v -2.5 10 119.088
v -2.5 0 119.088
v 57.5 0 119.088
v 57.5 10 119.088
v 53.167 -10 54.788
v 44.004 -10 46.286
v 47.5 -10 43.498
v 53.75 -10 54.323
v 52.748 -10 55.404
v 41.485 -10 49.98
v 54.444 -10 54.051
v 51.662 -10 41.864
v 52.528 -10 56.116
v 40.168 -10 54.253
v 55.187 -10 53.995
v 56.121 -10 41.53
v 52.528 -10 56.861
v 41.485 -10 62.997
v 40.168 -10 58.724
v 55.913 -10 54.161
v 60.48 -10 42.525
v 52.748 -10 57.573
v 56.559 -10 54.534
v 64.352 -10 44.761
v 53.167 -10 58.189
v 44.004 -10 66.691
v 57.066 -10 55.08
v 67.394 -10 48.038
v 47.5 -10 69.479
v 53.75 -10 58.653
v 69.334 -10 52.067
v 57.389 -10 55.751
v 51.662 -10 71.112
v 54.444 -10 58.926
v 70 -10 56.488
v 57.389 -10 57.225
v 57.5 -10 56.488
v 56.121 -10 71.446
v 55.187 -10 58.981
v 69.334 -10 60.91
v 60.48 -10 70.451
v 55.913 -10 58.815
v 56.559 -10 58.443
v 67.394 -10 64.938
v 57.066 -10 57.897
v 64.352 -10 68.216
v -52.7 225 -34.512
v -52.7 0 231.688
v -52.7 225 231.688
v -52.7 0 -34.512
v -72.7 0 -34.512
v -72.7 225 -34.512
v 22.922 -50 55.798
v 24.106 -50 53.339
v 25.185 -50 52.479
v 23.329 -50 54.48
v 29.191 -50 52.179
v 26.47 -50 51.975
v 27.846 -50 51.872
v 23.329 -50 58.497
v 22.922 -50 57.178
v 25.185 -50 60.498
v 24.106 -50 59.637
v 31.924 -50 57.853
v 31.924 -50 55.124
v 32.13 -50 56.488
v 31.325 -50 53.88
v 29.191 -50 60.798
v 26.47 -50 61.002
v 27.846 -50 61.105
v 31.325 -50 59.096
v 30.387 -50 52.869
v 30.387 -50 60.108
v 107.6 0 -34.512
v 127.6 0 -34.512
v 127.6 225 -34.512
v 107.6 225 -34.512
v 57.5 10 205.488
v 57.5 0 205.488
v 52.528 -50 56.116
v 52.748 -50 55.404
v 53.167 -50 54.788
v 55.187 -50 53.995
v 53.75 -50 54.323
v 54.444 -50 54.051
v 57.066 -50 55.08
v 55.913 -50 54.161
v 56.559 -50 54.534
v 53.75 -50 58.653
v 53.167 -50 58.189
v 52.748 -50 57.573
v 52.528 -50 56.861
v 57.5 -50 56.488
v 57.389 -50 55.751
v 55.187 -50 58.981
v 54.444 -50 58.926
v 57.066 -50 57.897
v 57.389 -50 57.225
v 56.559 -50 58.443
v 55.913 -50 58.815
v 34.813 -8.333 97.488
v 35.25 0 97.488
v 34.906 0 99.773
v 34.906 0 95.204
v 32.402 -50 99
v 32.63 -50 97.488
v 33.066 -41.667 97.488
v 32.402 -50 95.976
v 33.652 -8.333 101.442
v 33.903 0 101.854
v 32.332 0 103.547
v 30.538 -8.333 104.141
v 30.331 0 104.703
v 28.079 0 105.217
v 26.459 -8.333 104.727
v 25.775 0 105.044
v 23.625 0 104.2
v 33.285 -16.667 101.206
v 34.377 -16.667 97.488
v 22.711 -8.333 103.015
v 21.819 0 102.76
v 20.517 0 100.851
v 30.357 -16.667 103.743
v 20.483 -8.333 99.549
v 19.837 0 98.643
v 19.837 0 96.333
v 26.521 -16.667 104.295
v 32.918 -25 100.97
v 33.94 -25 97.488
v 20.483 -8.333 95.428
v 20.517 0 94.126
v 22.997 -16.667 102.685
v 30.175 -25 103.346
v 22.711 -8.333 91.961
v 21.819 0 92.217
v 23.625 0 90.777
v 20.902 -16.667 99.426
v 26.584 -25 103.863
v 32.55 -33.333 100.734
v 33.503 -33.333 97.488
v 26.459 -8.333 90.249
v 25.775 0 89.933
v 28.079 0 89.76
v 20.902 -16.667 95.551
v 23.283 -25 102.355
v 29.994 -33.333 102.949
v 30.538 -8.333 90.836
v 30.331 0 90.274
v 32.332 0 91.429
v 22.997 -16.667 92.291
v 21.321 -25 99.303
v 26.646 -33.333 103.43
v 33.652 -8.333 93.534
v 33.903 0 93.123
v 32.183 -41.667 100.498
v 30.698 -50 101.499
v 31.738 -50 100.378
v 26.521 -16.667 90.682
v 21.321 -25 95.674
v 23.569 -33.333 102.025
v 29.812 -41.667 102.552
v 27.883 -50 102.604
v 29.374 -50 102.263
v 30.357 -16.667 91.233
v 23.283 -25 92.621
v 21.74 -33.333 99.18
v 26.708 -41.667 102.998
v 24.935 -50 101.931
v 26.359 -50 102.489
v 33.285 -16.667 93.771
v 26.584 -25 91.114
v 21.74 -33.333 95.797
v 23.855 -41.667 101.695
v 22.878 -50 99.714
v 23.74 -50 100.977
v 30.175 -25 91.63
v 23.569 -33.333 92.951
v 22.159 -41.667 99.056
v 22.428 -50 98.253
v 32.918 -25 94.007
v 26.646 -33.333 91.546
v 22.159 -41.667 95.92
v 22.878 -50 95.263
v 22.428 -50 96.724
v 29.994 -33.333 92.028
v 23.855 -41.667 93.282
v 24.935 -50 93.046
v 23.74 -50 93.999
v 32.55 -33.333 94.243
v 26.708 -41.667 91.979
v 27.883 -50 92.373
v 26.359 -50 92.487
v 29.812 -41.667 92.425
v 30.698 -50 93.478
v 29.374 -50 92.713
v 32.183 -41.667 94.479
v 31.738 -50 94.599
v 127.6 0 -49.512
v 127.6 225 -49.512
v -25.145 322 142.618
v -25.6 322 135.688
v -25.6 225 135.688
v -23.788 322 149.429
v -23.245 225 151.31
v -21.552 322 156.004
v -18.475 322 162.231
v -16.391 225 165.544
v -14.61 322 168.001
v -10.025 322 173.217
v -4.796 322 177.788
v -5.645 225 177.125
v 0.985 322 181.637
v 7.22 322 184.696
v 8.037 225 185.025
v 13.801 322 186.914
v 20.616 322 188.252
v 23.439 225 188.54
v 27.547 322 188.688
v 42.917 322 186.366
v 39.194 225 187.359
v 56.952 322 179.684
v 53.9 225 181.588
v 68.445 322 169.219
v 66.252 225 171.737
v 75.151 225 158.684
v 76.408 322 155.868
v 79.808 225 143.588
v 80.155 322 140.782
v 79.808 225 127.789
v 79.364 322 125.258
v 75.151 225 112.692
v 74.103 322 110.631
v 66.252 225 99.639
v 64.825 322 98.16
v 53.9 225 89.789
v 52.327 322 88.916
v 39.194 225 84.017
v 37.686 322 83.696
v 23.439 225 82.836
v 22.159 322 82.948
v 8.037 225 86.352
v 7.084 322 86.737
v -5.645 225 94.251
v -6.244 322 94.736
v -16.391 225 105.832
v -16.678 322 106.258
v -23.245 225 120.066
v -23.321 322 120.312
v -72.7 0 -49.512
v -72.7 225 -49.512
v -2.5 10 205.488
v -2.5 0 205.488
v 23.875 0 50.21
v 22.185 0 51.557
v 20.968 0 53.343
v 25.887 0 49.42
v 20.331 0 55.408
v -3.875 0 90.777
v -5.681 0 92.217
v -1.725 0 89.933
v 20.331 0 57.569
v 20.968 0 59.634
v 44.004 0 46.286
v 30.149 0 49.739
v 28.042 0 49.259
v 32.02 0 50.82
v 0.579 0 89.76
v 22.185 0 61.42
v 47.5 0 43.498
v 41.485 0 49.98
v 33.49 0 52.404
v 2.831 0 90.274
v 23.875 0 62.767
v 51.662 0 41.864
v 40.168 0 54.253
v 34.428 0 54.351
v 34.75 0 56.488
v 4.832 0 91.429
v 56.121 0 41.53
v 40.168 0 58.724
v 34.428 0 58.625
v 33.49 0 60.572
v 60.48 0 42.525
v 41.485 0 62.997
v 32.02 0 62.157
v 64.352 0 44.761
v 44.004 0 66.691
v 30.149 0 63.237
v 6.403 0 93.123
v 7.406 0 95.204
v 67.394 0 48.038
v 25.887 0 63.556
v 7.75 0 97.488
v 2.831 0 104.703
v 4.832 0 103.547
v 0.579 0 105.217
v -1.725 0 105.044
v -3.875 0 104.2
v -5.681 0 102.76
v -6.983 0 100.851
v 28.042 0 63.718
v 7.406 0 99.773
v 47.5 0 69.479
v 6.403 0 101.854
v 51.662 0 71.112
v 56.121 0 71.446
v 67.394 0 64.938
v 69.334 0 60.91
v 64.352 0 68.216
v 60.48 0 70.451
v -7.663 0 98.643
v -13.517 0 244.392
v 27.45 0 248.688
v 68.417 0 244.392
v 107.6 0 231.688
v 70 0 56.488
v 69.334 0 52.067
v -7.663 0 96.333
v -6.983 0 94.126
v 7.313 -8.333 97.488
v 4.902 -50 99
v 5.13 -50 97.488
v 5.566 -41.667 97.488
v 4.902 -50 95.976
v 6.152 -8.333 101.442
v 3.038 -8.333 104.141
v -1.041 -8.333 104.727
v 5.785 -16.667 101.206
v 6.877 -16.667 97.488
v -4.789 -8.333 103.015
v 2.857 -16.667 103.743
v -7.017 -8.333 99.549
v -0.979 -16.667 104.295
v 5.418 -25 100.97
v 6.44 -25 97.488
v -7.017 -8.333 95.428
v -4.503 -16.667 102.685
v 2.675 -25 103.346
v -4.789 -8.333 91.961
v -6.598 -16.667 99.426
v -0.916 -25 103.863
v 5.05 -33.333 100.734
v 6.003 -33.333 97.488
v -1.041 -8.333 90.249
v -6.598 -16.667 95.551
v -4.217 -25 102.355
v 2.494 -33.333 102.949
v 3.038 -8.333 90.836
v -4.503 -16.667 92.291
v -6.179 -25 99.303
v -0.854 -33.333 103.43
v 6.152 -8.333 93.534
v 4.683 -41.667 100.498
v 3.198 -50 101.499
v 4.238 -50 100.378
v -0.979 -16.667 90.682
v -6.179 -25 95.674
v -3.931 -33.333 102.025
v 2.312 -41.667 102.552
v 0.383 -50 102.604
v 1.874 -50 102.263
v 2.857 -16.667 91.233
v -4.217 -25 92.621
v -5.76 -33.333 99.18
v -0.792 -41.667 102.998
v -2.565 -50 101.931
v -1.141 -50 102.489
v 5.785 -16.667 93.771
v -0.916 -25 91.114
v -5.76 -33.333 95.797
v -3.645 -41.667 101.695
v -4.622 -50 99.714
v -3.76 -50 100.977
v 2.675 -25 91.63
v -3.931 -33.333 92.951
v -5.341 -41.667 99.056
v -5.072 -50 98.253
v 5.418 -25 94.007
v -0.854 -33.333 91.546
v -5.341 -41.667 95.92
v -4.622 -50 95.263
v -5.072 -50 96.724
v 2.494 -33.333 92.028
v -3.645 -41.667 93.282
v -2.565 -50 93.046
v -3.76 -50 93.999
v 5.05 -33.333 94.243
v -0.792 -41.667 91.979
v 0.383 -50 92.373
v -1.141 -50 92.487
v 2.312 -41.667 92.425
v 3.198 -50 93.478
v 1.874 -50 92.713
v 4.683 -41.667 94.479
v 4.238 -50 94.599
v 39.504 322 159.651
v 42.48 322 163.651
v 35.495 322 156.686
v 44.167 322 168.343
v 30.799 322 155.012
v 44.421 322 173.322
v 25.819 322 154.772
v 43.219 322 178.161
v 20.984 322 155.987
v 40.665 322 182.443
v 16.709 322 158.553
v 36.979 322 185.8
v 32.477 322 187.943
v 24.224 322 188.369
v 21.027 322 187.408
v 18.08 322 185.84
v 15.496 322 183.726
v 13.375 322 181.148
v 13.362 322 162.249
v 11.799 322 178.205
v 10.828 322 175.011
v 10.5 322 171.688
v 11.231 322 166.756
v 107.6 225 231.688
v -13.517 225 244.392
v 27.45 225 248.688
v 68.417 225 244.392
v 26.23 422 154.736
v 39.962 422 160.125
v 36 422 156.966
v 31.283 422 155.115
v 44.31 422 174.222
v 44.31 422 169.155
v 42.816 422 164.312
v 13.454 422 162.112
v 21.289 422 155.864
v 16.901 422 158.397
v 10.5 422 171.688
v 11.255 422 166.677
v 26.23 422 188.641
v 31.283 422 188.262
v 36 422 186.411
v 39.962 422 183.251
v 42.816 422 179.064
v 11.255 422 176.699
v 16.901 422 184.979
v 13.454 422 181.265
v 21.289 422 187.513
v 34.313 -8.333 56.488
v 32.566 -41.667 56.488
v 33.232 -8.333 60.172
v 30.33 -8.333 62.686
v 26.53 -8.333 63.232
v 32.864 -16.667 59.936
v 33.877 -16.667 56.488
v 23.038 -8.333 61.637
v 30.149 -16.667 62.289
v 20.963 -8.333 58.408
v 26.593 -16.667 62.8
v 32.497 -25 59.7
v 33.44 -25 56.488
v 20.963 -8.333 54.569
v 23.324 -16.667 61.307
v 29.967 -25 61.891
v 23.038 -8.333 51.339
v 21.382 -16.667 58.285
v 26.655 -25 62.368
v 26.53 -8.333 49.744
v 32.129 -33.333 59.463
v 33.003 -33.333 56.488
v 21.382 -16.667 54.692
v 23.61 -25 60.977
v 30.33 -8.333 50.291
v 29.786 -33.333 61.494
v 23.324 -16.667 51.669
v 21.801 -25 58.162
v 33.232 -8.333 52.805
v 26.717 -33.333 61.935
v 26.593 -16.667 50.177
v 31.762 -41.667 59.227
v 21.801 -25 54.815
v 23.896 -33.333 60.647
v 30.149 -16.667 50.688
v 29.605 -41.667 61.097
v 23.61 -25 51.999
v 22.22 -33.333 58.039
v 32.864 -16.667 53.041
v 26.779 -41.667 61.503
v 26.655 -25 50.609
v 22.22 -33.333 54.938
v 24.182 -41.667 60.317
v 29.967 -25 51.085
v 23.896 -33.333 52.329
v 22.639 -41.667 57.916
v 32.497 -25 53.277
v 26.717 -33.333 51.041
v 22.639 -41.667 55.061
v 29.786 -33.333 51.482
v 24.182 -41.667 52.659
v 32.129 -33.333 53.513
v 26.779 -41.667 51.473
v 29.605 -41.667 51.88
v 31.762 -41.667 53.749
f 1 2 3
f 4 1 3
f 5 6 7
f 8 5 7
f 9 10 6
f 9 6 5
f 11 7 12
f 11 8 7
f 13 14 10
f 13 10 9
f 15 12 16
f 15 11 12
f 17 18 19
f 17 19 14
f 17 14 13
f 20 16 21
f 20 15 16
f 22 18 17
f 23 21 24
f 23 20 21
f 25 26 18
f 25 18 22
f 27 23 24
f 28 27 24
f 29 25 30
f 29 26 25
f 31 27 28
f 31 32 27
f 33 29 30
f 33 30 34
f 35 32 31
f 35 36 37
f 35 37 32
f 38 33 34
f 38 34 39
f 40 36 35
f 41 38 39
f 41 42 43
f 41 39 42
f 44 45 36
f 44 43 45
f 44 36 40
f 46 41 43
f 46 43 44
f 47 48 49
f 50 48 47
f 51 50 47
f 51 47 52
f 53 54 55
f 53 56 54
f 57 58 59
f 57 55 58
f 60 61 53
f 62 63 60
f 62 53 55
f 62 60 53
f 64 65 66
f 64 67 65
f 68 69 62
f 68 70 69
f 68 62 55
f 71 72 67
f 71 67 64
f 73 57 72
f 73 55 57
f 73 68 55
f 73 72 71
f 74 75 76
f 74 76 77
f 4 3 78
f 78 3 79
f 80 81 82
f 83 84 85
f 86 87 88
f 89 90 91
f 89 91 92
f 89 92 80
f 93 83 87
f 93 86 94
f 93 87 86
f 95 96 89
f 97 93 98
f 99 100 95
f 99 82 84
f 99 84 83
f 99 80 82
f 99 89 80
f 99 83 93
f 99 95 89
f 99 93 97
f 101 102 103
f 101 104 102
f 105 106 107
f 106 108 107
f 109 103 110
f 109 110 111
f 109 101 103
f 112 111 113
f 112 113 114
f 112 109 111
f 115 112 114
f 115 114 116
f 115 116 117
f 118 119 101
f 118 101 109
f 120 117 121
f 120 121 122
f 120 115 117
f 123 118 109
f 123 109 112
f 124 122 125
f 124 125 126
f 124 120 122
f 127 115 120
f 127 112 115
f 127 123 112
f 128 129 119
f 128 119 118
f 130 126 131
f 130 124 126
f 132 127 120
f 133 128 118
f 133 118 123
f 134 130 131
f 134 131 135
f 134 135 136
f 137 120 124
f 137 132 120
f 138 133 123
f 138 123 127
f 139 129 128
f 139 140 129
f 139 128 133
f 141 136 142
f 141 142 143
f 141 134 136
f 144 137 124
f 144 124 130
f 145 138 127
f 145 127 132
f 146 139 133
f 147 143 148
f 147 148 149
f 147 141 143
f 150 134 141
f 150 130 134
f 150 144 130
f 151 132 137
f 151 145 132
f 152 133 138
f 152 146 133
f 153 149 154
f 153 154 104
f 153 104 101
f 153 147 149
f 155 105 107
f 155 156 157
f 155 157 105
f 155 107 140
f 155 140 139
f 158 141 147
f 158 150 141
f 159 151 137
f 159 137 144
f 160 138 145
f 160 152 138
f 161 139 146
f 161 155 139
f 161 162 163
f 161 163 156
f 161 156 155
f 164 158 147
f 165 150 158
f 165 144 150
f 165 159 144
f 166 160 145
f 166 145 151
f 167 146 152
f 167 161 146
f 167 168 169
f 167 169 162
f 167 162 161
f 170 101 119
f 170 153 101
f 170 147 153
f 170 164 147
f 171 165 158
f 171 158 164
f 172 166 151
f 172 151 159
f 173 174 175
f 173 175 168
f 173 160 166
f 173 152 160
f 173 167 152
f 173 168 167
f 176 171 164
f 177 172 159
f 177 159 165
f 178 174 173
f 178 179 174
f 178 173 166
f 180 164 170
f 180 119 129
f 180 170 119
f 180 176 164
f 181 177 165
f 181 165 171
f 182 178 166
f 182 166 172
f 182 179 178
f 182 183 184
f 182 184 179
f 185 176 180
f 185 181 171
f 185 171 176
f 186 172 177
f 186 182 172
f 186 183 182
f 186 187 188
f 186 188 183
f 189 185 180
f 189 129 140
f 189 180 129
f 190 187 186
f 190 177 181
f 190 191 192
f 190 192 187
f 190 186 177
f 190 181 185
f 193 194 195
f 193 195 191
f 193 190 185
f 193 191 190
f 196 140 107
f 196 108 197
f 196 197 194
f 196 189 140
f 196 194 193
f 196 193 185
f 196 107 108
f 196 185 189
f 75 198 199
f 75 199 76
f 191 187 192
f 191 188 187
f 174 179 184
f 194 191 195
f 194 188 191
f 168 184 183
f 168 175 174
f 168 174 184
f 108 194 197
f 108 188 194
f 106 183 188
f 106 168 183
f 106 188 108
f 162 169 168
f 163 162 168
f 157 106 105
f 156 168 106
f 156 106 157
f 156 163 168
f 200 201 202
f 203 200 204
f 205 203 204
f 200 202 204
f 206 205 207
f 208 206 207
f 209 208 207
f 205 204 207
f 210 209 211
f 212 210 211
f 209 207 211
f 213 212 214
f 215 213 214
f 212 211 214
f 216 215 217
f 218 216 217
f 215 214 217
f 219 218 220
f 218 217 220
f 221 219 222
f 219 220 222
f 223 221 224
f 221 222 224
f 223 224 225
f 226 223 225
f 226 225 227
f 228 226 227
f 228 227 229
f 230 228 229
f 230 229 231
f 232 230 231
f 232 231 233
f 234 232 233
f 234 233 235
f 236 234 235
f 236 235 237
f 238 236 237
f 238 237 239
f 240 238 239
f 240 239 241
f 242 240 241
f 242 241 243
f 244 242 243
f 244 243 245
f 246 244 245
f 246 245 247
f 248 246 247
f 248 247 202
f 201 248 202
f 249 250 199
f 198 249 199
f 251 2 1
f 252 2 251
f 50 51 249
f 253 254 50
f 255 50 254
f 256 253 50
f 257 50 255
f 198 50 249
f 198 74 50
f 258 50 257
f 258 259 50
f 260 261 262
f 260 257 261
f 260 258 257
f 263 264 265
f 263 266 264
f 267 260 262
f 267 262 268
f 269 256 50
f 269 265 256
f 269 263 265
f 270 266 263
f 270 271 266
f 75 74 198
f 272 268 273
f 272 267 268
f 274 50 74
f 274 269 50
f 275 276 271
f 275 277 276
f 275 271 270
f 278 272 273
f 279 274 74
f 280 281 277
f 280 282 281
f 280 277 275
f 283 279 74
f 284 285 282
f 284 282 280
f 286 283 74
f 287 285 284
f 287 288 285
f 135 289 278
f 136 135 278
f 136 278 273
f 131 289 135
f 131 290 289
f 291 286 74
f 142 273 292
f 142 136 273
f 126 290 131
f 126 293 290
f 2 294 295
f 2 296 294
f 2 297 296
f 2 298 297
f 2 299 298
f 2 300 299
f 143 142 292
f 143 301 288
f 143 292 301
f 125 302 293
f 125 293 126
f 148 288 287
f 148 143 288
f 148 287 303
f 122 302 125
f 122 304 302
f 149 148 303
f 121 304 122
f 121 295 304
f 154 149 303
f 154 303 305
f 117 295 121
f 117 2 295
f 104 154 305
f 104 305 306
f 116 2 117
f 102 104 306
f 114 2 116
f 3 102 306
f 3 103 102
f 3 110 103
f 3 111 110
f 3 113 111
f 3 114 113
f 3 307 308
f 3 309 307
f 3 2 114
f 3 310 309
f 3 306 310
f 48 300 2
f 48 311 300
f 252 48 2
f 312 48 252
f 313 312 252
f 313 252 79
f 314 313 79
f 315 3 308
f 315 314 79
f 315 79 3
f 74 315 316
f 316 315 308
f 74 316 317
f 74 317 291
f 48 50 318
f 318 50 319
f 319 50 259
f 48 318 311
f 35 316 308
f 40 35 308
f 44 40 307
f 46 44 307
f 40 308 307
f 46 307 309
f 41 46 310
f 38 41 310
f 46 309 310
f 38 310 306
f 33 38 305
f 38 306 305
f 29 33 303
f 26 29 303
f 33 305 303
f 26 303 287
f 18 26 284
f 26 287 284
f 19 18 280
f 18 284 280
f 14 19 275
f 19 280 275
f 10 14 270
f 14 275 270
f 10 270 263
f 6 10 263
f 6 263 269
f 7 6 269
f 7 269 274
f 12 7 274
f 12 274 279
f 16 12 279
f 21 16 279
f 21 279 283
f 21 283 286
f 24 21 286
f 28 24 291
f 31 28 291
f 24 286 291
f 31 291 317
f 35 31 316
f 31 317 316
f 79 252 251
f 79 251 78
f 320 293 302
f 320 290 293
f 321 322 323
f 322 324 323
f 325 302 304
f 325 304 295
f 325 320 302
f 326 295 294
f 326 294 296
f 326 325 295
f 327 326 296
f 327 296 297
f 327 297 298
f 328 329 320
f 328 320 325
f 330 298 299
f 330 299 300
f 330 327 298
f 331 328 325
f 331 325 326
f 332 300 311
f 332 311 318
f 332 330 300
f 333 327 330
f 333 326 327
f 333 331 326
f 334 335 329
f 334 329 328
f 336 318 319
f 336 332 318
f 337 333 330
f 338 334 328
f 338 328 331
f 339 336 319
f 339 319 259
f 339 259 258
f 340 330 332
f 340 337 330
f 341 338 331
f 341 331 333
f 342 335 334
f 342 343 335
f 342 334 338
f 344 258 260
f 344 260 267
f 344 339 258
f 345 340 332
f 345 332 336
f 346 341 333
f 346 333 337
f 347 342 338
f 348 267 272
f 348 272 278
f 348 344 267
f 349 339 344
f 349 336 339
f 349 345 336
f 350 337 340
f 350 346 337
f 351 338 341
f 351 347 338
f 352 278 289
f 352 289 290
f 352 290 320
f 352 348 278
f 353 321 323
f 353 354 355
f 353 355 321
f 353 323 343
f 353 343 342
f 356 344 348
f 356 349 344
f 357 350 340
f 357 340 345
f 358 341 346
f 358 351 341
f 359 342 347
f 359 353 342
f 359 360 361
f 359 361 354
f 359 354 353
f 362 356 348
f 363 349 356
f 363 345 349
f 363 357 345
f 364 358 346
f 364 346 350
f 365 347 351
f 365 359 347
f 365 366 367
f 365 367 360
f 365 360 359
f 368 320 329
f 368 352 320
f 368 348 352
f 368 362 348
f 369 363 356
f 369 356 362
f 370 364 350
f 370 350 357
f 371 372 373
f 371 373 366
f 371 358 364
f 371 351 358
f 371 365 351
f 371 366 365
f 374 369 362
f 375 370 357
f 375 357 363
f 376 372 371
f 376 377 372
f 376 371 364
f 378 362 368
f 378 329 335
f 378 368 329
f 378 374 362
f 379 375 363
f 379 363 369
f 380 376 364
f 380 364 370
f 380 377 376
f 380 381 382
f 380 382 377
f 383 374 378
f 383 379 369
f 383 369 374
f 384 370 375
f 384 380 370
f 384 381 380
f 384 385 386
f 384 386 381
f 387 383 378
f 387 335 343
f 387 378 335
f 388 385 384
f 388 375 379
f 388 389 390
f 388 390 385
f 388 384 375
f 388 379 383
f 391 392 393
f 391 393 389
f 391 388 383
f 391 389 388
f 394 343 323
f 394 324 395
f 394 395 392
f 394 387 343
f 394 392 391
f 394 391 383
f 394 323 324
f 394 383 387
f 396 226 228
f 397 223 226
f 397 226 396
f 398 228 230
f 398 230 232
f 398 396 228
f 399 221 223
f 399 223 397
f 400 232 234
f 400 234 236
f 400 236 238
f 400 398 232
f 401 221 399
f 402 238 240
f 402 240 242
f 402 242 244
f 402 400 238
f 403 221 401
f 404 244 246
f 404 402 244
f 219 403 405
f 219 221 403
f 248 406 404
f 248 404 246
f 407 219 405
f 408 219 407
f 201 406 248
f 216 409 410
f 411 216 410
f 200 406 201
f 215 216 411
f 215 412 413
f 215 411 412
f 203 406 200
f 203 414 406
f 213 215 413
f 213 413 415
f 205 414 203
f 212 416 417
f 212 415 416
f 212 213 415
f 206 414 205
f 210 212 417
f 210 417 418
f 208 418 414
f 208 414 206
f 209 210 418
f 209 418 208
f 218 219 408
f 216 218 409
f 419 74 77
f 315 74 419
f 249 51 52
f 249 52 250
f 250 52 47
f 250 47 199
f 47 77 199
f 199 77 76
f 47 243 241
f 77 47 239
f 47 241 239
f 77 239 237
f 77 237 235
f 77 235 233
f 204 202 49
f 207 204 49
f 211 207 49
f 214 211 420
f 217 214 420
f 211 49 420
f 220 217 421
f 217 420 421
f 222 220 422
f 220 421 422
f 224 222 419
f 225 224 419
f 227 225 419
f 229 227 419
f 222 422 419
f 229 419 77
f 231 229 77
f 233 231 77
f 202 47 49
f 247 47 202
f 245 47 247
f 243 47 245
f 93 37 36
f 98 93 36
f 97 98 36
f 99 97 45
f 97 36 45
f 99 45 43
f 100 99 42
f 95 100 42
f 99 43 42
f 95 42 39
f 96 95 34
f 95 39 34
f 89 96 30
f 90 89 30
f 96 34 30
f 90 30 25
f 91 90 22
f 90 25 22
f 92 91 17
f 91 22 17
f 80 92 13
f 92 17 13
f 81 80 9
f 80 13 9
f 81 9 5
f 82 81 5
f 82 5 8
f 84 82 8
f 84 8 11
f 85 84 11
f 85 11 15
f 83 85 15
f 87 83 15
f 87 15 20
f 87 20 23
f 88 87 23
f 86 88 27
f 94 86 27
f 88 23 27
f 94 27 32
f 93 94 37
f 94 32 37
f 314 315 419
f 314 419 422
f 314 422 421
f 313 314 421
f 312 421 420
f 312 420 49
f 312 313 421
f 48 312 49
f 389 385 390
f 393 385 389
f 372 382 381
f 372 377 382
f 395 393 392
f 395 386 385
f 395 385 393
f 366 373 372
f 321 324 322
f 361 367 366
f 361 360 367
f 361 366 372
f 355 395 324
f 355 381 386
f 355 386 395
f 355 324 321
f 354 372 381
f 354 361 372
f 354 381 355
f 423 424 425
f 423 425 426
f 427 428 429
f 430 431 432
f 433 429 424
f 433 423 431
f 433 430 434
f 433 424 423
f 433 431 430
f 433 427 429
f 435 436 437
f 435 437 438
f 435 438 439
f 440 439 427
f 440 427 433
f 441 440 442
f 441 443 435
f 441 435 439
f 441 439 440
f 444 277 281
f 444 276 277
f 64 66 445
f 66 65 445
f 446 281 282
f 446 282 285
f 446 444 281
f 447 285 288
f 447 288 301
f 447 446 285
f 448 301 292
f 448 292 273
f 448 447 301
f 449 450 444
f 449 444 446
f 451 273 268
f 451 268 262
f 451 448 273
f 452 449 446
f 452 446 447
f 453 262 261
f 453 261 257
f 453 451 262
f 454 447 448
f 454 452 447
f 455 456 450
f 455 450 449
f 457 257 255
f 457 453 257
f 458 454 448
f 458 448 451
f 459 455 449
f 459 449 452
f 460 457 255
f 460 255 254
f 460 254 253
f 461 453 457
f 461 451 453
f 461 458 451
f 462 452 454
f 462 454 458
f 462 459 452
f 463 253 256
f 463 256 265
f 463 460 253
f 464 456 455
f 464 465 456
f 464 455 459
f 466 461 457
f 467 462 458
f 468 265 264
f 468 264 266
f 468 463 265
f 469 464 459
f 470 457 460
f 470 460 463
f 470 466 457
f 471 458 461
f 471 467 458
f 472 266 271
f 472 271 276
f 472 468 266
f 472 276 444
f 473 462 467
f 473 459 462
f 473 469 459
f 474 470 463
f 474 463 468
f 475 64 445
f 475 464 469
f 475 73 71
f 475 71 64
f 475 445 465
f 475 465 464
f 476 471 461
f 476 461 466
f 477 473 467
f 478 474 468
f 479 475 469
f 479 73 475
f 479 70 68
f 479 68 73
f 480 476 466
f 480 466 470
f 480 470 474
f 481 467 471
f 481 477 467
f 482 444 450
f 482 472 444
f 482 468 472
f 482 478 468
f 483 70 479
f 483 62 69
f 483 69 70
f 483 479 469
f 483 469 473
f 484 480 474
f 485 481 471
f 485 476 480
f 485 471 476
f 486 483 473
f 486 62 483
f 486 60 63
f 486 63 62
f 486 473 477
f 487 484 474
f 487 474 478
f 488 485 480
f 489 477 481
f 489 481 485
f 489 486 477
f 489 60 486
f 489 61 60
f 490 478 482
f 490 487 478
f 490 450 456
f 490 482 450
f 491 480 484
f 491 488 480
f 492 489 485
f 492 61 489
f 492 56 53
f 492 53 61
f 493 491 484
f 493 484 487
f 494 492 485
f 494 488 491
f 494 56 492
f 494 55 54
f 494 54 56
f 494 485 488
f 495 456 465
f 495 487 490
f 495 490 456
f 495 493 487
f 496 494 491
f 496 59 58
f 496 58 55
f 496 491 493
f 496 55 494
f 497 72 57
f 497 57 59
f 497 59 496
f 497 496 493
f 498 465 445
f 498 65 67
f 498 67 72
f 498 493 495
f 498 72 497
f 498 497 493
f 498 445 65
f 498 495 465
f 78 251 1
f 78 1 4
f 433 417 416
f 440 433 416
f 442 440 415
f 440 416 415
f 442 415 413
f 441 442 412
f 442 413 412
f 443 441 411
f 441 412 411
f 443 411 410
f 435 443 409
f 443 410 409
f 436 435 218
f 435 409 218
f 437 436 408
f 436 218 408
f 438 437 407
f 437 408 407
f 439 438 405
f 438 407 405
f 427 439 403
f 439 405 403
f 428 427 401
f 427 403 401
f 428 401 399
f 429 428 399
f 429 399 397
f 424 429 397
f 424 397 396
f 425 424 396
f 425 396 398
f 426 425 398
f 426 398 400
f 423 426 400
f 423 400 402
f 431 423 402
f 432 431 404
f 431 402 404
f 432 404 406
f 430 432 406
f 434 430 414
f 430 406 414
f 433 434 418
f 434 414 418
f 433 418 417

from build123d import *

# Parameters (mm, degrees)
F0_R      = 7.75
F0_R_2    = 7.25
F0_R_3    = 15
F0_W      = 60
F0_H      = 86.4
F1_DEPTH  = 225
F2_DEPTH  = 50
F2_TAPER  = 3
F3_DEPTH  = 50
F3_TAPER  = 3
F4_DEPTH  = 10
F5_DEPTH  = 10
F6_R      = 2.5
F7_DEPTH  = 40
F8_R      = 53
F9_DEPTH  = 97
F10_R     = 16.9998611114
F11_DEPTH = 100


with BuildPart() as f1:
    # F0 (on Front) → F1 (new body)
    with BuildSketch(Plane.XZ):
        Polygon((-72.7, -34.5117315553), (-72.7, -49.5117315553), (127.6, -49.5117315553), (127.6, -34.5117315553), (107.6, -34.5117315553), (107.6, 231.6882684447), (-52.7, 231.6882684447), (-52.7, -34.5117315553), align=None)
        with Locations((0, 97.4882684447)):
            Circle(F0_R, mode=Mode.SUBTRACT)
        with Locations((27.5, 56.4882684447)):
            Circle(F0_R_2, mode=Mode.SUBTRACT)
        with Locations((55, 56.4882684447)):
            Circle(F0_R_3, mode=Mode.SUBTRACT)
        with Locations((27.5, 97.4882684447)):
            Circle(F0_R, mode=Mode.SUBTRACT)
        with Locations((27.5, 162.2882684447)):
            Rectangle(F0_W, F0_H, mode=Mode.SUBTRACT)
        with BuildLine():
            ThreePointArc((107.6, 231.6882684447), (27.45, 248.6882684447), (-52.7, 231.6882684447))
            Line((-52.7, 231.6882684447), (107.6, 231.6882684447))
        make_face()
        with Locations((27.5, 162.2882684447)):
            Rectangle(F0_W, F0_H)
        with Locations((0, 97.4882684447)):
            Circle(F0_R)
        with Locations((27.5, 97.4882684447)):
            Circle(F0_R)
        with Locations((55, 56.4882684447)):
            Circle(F0_R_3)
        with Locations((27.5, 56.4882684447)):
            Circle(F0_R_2)
    extrude(amount=-F1_DEPTH)

    # F0 (on Front) → F2 (join)
    with BuildSketch(Plane.XZ):
        with Locations((0, 97.4882684447)):
            Circle(F0_R)
        with Locations((27.5, 97.4882684447)):
            Circle(F0_R)
    extrude(amount=F2_DEPTH, taper=F2_TAPER)

    # F0 (on Front) → F3 (join)
    with BuildSketch(Plane.XZ):
        with Locations((27.5, 56.4882684447)):
            Circle(F0_R_2)
    extrude(amount=F3_DEPTH, taper=F3_TAPER)

    # F0 (on Front) → F4 (cut)
    with BuildSketch(Plane.XZ):
        with Locations((27.5, 162.2882684447)):
            Rectangle(F0_W, F0_H)
    extrude(amount=-F4_DEPTH, mode=Mode.SUBTRACT)

    # F0 (on Front) → F5 (join)
    with BuildSketch(Plane.XZ):
        with Locations((55, 56.4882684447)):
            Circle(F0_R_3)
    extrude(amount=F5_DEPTH)

    # F6 (on face) → F7 (join)
    with BuildSketch(Plane.XZ.offset(10)):
        with Locations((55, 56.4882684447)):
            Circle(F6_R)
    extrude(amount=F7_DEPTH)

    # F8 (on face) → F9 (join)
    with BuildSketch(Plane(origin=(0, 225, 0), x_dir=(-1, 0, 0), z_dir=(0, 1, 0))):
        with Locations((-27.4, 135.6882684447)):
            Circle(F8_R)
    extrude(amount=F9_DEPTH)

    # F10 (on face) → F11 (join)
    with BuildSketch(Plane(origin=(0, 322, 0), x_dir=(-1, 0, 0), z_dir=(0, 1, 0))):
        with Locations((-27.5, 171.6882684447)):
            Circle(F10_R)
    extrude(amount=F11_DEPTH)


solid = f1.part
